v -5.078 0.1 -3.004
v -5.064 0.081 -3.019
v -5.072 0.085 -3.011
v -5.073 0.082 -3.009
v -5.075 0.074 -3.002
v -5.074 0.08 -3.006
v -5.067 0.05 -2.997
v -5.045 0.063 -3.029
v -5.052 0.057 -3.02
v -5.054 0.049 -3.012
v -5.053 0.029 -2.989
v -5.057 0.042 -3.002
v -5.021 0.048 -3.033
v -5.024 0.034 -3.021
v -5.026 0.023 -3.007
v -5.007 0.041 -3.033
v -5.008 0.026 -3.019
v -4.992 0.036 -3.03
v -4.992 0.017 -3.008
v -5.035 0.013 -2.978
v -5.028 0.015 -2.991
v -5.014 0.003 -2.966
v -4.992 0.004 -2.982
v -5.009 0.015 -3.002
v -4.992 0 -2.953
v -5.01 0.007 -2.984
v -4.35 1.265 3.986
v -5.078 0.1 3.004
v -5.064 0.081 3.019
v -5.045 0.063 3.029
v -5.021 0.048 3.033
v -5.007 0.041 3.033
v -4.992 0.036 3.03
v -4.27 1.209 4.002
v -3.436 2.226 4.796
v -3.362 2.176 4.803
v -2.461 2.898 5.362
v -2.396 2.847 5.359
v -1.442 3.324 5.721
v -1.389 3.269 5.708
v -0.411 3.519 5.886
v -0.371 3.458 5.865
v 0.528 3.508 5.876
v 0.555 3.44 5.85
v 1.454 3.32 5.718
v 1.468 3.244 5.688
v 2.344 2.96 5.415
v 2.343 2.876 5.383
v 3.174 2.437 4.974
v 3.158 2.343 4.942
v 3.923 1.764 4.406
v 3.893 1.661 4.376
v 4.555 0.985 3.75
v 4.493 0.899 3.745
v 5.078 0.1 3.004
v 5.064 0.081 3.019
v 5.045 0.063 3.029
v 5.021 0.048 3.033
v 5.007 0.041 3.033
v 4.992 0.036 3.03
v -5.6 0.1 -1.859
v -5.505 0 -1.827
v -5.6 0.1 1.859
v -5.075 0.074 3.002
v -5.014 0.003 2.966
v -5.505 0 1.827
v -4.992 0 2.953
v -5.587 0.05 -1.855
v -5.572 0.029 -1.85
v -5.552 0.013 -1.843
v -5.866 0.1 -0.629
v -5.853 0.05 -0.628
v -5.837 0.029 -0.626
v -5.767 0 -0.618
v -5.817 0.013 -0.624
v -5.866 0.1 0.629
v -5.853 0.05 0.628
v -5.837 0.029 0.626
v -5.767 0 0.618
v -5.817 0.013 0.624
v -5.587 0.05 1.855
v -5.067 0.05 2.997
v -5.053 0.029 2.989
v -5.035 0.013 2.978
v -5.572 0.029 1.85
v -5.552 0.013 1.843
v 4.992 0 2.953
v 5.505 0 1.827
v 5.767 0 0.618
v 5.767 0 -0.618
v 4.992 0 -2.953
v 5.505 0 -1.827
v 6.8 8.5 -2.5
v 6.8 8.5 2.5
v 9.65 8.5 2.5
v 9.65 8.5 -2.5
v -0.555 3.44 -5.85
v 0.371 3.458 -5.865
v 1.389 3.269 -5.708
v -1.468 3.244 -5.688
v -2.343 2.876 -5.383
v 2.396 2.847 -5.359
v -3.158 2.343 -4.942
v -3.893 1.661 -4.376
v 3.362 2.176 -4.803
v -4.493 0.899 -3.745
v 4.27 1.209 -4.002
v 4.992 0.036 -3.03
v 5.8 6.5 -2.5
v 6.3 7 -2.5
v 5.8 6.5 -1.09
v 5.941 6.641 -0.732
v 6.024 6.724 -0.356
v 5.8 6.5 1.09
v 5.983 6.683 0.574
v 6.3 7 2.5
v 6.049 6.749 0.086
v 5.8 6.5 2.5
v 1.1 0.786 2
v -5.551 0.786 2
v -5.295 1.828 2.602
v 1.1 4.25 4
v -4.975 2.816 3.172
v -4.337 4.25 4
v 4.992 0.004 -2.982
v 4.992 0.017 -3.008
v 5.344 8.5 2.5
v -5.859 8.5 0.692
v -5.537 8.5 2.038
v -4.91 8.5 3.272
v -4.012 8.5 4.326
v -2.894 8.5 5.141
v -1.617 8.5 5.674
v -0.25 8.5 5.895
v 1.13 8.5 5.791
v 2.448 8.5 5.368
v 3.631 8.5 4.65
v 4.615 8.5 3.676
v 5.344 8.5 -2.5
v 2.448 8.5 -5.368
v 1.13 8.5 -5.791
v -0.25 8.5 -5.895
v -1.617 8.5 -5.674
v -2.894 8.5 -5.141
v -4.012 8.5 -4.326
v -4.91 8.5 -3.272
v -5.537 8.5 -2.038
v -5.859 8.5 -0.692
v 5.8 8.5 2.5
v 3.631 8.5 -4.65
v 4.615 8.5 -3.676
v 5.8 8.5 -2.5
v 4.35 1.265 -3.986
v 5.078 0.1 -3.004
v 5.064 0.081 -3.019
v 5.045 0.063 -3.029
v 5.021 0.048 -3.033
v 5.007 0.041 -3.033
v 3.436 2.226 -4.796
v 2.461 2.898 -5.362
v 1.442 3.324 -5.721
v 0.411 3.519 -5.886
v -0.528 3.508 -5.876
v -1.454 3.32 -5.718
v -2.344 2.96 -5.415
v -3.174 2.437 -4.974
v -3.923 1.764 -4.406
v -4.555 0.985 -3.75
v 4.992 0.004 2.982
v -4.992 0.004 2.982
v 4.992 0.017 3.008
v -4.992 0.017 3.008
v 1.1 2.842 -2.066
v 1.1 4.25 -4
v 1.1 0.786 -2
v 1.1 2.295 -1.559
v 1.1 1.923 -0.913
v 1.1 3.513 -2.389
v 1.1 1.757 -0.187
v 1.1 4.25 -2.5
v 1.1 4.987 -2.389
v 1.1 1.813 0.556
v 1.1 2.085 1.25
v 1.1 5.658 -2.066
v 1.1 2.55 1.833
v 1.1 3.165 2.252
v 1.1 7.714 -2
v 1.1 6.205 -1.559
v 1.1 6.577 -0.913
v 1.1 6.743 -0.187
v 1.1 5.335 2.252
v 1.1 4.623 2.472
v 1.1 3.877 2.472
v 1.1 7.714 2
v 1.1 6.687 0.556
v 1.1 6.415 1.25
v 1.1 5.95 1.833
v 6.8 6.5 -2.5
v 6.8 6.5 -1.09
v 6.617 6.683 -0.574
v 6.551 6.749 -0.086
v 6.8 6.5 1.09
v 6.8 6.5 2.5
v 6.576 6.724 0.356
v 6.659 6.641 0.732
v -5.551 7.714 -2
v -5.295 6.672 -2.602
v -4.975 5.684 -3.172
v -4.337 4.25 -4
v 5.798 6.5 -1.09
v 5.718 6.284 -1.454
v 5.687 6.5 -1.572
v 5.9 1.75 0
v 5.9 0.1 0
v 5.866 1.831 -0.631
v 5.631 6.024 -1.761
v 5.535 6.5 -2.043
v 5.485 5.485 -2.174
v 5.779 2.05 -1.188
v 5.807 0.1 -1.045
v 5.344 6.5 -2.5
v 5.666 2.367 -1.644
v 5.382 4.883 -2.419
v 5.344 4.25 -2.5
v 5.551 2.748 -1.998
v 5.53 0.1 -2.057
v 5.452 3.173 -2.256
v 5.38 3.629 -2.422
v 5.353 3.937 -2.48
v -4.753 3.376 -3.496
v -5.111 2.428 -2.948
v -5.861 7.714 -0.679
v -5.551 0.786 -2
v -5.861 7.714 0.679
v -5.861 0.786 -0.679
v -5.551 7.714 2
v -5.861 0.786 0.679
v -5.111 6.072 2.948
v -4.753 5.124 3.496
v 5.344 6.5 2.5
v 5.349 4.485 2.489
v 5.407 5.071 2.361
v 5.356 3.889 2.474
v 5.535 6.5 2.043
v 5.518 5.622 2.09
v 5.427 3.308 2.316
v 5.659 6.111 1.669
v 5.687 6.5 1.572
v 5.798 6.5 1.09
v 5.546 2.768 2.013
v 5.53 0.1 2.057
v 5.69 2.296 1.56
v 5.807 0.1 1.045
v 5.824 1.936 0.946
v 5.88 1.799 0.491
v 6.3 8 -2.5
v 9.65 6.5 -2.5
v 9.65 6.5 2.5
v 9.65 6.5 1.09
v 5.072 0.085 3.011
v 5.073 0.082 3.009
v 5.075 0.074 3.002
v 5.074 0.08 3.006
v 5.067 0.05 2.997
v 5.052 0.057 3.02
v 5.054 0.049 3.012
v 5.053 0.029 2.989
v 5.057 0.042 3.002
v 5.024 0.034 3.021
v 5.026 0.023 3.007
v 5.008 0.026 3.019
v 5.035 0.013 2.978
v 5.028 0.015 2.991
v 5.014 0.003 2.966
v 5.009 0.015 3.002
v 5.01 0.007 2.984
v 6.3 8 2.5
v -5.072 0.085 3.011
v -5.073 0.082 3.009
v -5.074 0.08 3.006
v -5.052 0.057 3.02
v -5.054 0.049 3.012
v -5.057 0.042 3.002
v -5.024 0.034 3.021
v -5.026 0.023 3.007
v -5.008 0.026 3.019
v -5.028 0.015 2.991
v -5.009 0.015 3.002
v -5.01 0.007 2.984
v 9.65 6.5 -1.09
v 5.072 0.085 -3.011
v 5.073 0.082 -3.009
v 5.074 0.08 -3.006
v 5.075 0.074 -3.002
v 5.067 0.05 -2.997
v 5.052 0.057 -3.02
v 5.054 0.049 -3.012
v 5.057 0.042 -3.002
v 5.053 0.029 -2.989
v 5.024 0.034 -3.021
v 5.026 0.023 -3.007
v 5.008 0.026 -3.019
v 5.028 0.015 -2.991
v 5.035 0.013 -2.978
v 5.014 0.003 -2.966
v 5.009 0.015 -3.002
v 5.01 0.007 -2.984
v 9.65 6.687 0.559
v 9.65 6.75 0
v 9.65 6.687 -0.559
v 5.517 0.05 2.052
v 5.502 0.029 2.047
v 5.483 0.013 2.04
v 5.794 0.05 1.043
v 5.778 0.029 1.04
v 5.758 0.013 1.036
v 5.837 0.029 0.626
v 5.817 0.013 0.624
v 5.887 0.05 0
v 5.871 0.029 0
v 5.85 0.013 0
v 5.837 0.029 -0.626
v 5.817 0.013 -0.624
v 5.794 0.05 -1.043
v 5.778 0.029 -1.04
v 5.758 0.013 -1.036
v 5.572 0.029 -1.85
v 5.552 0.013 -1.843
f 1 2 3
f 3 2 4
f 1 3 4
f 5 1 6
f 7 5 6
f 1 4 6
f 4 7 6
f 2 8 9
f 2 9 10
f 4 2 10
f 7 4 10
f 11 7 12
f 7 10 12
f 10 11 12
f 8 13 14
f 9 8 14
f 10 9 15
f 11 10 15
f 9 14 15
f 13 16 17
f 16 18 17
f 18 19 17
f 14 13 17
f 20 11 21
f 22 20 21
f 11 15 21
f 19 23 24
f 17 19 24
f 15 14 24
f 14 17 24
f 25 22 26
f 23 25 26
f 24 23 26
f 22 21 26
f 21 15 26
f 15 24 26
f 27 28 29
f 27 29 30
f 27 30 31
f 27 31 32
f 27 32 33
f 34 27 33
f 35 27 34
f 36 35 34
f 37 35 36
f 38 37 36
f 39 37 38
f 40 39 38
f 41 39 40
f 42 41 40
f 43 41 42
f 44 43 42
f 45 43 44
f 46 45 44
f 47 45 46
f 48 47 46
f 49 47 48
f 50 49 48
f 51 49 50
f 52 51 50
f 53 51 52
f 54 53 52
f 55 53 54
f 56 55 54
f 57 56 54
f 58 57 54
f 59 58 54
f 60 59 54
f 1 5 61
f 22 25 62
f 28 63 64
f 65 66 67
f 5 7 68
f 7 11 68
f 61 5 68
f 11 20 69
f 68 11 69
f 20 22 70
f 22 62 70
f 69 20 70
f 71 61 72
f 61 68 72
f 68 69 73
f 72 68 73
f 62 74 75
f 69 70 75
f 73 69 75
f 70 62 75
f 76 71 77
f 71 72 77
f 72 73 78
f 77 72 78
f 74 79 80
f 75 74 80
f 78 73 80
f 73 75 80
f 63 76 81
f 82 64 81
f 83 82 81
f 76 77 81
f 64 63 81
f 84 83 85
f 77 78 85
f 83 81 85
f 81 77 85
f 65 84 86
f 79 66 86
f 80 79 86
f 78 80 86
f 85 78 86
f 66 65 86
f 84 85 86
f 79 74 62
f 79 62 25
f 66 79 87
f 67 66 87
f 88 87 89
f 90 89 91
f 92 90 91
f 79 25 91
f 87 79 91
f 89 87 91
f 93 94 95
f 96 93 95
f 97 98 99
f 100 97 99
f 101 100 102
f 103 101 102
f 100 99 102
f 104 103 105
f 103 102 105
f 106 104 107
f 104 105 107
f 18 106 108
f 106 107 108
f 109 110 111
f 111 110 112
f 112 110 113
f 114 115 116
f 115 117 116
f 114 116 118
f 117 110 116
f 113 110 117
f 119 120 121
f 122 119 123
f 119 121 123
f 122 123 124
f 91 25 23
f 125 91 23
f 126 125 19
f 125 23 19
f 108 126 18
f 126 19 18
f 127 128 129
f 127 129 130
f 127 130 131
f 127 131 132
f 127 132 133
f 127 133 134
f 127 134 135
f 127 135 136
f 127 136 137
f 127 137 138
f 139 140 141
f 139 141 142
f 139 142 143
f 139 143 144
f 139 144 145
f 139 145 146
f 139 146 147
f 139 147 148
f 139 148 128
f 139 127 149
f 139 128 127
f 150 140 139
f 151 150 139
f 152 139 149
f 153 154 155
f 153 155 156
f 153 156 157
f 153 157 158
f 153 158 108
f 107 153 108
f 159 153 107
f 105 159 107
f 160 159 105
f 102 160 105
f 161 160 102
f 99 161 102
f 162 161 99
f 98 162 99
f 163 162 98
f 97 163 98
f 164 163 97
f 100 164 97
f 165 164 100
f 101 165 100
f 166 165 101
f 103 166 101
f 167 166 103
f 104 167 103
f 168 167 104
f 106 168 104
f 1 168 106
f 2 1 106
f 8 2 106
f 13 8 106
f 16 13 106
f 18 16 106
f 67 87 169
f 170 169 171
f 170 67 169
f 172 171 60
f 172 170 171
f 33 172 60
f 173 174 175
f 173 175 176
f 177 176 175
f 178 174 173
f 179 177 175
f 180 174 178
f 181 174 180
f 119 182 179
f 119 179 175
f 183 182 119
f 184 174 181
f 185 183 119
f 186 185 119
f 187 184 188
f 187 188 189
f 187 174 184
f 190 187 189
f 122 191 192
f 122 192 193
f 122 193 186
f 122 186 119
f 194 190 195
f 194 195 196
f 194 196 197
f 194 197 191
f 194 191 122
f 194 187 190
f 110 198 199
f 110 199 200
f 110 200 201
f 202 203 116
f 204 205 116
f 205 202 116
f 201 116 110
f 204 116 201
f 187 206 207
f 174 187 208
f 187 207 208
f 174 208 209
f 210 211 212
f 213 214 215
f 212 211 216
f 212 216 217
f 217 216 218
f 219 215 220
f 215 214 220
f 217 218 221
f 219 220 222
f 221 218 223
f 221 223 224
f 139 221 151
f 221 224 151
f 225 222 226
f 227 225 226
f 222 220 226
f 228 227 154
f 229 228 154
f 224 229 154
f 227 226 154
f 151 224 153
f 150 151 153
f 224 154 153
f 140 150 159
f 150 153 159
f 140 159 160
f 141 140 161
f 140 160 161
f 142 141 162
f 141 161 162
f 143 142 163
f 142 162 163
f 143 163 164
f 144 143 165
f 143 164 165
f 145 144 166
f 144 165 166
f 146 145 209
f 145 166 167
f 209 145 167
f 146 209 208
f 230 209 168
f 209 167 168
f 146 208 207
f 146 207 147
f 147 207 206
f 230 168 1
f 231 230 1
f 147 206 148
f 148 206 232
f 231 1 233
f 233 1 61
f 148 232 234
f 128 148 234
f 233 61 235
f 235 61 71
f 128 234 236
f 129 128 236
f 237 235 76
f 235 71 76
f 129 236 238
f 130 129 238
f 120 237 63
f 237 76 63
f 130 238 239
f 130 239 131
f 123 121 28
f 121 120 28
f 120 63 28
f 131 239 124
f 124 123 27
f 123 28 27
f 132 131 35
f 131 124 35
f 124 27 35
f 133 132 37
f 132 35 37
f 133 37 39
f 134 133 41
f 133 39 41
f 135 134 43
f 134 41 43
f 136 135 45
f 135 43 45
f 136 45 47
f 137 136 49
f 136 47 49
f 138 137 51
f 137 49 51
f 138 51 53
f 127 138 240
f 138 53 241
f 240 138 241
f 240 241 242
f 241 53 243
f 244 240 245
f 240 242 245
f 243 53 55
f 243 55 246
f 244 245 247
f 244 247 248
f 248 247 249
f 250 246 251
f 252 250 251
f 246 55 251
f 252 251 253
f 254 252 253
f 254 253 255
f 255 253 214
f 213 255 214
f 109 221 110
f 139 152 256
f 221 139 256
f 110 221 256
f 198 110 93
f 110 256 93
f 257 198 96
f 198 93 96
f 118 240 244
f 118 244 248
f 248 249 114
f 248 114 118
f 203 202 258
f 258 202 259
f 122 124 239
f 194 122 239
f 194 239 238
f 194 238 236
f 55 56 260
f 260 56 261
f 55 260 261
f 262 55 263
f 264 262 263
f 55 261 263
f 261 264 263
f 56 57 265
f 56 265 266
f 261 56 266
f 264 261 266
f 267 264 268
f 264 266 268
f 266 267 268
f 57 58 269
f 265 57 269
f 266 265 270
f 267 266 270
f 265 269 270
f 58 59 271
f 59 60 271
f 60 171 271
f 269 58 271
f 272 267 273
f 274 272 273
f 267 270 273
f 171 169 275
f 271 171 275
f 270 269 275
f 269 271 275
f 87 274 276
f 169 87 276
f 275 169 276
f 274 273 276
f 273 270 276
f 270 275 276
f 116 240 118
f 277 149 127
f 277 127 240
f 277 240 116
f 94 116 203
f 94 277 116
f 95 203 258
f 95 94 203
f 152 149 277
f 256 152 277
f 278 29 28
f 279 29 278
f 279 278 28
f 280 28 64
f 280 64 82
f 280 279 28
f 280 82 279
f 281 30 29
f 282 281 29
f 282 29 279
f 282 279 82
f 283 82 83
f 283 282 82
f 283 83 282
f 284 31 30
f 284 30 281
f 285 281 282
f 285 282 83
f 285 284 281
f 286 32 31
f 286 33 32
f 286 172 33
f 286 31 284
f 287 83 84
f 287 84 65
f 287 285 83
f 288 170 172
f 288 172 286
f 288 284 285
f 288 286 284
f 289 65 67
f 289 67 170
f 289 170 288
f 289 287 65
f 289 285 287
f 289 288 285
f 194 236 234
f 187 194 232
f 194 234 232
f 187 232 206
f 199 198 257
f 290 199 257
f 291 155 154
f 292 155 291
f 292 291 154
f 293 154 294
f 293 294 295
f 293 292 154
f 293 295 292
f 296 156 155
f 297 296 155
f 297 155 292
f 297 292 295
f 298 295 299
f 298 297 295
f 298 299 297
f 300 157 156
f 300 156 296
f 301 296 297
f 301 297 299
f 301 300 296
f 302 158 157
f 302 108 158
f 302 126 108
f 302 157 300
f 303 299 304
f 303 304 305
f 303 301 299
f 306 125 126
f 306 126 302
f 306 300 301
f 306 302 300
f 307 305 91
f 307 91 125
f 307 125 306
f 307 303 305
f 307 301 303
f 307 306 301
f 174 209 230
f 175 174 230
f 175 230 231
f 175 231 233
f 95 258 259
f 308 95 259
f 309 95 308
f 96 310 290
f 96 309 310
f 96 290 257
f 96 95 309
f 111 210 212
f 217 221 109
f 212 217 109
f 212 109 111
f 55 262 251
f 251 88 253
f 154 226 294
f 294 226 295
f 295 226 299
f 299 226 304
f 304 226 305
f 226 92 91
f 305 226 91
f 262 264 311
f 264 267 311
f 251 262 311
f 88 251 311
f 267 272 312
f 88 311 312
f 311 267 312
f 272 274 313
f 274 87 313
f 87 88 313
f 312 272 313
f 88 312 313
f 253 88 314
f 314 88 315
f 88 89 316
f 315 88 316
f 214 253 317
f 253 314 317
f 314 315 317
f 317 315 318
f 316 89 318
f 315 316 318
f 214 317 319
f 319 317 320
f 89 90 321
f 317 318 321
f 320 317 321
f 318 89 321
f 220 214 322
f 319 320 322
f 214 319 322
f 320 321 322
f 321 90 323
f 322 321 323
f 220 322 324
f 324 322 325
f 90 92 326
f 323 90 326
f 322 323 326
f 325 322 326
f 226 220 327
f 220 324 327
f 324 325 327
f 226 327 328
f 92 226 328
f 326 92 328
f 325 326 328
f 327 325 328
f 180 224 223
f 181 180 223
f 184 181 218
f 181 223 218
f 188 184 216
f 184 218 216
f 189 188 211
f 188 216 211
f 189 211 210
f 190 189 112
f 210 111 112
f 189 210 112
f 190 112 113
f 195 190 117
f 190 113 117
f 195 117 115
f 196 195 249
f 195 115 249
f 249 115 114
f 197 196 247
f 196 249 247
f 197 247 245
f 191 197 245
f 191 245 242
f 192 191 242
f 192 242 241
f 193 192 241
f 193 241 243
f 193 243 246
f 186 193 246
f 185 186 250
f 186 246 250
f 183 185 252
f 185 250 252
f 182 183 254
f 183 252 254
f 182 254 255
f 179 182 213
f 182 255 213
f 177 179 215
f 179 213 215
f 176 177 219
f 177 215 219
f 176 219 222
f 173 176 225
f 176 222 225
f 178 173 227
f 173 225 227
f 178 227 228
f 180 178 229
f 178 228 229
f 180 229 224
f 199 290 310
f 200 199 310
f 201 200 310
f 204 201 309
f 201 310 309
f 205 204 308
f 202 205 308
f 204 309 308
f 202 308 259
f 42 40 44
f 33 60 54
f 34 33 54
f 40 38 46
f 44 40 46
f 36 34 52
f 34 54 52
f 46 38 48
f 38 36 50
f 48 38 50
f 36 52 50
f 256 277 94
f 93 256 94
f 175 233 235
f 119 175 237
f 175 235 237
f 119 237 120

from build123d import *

# Parameters (mm, degrees)
SKETCH1_R          = 5.9
EXTRUDE1_DEPTH     = 8.5
SKETCH2_W          = 9.65
SKETCH2_H          = 5
EXTRUDE2_DEPTH     = 2
SKETCH3_R          = 2.5
CUT_EXTRUDE1_DEPTH = 16.55
CUT_EXTRUDE2_DEPTH = 9.4000001
CUT_EXTRUDE3_DEPTH = 16.5500001
FILLET2_R          = 0.1
CUT_EXTRUDE5_DEPTH = 7


with BuildPart() as part:
    # Sketch1 → Extrude1 (new body)
    with BuildSketch(Plane(origin=(0, 0, 0), x_dir=(1, 0, 0), z_dir=(0, 1, 0))):
        Circle(SKETCH1_R)
    extrude(amount=EXTRUDE1_DEPTH)

    # Sketch2 → Extrude2 (add)
    with BuildSketch(Plane(origin=(0, 8.5, 0), x_dir=(1, 0, 0), z_dir=(0, 1, 0))):
        with Locations((4.825, 0)):
            Rectangle(SKETCH2_W, SKETCH2_H)
    extrude(amount=-EXTRUDE2_DEPTH)

    # Sketch3 → Cut-Extrude1 (cut, through all)
    with BuildSketch(Plane(origin=(9.65, 0, 0), x_dir=(0, 0, -1), z_dir=(1, 0, 0))):
        with Locations((0, 4.25)):
            Circle(SKETCH3_R)
    extrude(amount=-CUT_EXTRUDE1_DEPTH, mode=Mode.SUBTRACT)

    # Sketch4 → Cut-Extrude2 (cut, through all)
    with BuildSketch(Plane.XY.offset(2.5)):
        Polygon((6.8, 8.5), (5.8, 8.5), (6.3, 8), align=None)
        Polygon((6.3, 7), (5.8, 6.5), (6.8, 6.5), align=None)
    extrude(amount=-CUT_EXTRUDE2_DEPTH, mode=Mode.SUBTRACT)

    # Sketch5 → Cut-Extrude3 (cut, through all)
    with BuildSketch(Plane(origin=(9.65, 0, 0), x_dir=(0, 0, -1), z_dir=(1, 0, 0))):
        Polygon((-5.9, 3.5), (-6.106265144, 3.5), (-6.003132572, -0.278643129), (6.106265144, -0.15610938), (6.106265144, 3.632225684), (5.9, 3.5), (3, 0), (-3, 0), align=None)
    extrude(amount=-CUT_EXTRUDE3_DEPTH, mode=Mode.SUBTRACT)

    # Fillet2
    fillet2_edges = [part.edges().sort_by_distance(p)[0] for p in [
        (5.691400991, 0, -1.554977415),
        (-5.9, 0, 0),
        (0, 0, -3),
        (0, 0, 3),
        (-3.201105027, 2.360810271, 4.956099939),
        (3.201105027, 2.360810271, -4.956099939),
    ]]
    fillet(fillet2_edges, radius=FILLET2_R)

    # Sketch7 → Cut-Extrude5 (cut)
    with BuildSketch(Plane(origin=(-5.9, 0, 0), x_dir=(0, 0, -1), z_dir=(1, 0, 0))):
        Polygon((-4, 4.25), (-2, 7.714101615), (2, 7.714101615), (4, 4.25), (2, 0.785898385), (-2, 0.785898385), align=None)
    extrude(amount=CUT_EXTRUDE5_DEPTH, mode=Mode.SUBTRACT)


solid = part.part
